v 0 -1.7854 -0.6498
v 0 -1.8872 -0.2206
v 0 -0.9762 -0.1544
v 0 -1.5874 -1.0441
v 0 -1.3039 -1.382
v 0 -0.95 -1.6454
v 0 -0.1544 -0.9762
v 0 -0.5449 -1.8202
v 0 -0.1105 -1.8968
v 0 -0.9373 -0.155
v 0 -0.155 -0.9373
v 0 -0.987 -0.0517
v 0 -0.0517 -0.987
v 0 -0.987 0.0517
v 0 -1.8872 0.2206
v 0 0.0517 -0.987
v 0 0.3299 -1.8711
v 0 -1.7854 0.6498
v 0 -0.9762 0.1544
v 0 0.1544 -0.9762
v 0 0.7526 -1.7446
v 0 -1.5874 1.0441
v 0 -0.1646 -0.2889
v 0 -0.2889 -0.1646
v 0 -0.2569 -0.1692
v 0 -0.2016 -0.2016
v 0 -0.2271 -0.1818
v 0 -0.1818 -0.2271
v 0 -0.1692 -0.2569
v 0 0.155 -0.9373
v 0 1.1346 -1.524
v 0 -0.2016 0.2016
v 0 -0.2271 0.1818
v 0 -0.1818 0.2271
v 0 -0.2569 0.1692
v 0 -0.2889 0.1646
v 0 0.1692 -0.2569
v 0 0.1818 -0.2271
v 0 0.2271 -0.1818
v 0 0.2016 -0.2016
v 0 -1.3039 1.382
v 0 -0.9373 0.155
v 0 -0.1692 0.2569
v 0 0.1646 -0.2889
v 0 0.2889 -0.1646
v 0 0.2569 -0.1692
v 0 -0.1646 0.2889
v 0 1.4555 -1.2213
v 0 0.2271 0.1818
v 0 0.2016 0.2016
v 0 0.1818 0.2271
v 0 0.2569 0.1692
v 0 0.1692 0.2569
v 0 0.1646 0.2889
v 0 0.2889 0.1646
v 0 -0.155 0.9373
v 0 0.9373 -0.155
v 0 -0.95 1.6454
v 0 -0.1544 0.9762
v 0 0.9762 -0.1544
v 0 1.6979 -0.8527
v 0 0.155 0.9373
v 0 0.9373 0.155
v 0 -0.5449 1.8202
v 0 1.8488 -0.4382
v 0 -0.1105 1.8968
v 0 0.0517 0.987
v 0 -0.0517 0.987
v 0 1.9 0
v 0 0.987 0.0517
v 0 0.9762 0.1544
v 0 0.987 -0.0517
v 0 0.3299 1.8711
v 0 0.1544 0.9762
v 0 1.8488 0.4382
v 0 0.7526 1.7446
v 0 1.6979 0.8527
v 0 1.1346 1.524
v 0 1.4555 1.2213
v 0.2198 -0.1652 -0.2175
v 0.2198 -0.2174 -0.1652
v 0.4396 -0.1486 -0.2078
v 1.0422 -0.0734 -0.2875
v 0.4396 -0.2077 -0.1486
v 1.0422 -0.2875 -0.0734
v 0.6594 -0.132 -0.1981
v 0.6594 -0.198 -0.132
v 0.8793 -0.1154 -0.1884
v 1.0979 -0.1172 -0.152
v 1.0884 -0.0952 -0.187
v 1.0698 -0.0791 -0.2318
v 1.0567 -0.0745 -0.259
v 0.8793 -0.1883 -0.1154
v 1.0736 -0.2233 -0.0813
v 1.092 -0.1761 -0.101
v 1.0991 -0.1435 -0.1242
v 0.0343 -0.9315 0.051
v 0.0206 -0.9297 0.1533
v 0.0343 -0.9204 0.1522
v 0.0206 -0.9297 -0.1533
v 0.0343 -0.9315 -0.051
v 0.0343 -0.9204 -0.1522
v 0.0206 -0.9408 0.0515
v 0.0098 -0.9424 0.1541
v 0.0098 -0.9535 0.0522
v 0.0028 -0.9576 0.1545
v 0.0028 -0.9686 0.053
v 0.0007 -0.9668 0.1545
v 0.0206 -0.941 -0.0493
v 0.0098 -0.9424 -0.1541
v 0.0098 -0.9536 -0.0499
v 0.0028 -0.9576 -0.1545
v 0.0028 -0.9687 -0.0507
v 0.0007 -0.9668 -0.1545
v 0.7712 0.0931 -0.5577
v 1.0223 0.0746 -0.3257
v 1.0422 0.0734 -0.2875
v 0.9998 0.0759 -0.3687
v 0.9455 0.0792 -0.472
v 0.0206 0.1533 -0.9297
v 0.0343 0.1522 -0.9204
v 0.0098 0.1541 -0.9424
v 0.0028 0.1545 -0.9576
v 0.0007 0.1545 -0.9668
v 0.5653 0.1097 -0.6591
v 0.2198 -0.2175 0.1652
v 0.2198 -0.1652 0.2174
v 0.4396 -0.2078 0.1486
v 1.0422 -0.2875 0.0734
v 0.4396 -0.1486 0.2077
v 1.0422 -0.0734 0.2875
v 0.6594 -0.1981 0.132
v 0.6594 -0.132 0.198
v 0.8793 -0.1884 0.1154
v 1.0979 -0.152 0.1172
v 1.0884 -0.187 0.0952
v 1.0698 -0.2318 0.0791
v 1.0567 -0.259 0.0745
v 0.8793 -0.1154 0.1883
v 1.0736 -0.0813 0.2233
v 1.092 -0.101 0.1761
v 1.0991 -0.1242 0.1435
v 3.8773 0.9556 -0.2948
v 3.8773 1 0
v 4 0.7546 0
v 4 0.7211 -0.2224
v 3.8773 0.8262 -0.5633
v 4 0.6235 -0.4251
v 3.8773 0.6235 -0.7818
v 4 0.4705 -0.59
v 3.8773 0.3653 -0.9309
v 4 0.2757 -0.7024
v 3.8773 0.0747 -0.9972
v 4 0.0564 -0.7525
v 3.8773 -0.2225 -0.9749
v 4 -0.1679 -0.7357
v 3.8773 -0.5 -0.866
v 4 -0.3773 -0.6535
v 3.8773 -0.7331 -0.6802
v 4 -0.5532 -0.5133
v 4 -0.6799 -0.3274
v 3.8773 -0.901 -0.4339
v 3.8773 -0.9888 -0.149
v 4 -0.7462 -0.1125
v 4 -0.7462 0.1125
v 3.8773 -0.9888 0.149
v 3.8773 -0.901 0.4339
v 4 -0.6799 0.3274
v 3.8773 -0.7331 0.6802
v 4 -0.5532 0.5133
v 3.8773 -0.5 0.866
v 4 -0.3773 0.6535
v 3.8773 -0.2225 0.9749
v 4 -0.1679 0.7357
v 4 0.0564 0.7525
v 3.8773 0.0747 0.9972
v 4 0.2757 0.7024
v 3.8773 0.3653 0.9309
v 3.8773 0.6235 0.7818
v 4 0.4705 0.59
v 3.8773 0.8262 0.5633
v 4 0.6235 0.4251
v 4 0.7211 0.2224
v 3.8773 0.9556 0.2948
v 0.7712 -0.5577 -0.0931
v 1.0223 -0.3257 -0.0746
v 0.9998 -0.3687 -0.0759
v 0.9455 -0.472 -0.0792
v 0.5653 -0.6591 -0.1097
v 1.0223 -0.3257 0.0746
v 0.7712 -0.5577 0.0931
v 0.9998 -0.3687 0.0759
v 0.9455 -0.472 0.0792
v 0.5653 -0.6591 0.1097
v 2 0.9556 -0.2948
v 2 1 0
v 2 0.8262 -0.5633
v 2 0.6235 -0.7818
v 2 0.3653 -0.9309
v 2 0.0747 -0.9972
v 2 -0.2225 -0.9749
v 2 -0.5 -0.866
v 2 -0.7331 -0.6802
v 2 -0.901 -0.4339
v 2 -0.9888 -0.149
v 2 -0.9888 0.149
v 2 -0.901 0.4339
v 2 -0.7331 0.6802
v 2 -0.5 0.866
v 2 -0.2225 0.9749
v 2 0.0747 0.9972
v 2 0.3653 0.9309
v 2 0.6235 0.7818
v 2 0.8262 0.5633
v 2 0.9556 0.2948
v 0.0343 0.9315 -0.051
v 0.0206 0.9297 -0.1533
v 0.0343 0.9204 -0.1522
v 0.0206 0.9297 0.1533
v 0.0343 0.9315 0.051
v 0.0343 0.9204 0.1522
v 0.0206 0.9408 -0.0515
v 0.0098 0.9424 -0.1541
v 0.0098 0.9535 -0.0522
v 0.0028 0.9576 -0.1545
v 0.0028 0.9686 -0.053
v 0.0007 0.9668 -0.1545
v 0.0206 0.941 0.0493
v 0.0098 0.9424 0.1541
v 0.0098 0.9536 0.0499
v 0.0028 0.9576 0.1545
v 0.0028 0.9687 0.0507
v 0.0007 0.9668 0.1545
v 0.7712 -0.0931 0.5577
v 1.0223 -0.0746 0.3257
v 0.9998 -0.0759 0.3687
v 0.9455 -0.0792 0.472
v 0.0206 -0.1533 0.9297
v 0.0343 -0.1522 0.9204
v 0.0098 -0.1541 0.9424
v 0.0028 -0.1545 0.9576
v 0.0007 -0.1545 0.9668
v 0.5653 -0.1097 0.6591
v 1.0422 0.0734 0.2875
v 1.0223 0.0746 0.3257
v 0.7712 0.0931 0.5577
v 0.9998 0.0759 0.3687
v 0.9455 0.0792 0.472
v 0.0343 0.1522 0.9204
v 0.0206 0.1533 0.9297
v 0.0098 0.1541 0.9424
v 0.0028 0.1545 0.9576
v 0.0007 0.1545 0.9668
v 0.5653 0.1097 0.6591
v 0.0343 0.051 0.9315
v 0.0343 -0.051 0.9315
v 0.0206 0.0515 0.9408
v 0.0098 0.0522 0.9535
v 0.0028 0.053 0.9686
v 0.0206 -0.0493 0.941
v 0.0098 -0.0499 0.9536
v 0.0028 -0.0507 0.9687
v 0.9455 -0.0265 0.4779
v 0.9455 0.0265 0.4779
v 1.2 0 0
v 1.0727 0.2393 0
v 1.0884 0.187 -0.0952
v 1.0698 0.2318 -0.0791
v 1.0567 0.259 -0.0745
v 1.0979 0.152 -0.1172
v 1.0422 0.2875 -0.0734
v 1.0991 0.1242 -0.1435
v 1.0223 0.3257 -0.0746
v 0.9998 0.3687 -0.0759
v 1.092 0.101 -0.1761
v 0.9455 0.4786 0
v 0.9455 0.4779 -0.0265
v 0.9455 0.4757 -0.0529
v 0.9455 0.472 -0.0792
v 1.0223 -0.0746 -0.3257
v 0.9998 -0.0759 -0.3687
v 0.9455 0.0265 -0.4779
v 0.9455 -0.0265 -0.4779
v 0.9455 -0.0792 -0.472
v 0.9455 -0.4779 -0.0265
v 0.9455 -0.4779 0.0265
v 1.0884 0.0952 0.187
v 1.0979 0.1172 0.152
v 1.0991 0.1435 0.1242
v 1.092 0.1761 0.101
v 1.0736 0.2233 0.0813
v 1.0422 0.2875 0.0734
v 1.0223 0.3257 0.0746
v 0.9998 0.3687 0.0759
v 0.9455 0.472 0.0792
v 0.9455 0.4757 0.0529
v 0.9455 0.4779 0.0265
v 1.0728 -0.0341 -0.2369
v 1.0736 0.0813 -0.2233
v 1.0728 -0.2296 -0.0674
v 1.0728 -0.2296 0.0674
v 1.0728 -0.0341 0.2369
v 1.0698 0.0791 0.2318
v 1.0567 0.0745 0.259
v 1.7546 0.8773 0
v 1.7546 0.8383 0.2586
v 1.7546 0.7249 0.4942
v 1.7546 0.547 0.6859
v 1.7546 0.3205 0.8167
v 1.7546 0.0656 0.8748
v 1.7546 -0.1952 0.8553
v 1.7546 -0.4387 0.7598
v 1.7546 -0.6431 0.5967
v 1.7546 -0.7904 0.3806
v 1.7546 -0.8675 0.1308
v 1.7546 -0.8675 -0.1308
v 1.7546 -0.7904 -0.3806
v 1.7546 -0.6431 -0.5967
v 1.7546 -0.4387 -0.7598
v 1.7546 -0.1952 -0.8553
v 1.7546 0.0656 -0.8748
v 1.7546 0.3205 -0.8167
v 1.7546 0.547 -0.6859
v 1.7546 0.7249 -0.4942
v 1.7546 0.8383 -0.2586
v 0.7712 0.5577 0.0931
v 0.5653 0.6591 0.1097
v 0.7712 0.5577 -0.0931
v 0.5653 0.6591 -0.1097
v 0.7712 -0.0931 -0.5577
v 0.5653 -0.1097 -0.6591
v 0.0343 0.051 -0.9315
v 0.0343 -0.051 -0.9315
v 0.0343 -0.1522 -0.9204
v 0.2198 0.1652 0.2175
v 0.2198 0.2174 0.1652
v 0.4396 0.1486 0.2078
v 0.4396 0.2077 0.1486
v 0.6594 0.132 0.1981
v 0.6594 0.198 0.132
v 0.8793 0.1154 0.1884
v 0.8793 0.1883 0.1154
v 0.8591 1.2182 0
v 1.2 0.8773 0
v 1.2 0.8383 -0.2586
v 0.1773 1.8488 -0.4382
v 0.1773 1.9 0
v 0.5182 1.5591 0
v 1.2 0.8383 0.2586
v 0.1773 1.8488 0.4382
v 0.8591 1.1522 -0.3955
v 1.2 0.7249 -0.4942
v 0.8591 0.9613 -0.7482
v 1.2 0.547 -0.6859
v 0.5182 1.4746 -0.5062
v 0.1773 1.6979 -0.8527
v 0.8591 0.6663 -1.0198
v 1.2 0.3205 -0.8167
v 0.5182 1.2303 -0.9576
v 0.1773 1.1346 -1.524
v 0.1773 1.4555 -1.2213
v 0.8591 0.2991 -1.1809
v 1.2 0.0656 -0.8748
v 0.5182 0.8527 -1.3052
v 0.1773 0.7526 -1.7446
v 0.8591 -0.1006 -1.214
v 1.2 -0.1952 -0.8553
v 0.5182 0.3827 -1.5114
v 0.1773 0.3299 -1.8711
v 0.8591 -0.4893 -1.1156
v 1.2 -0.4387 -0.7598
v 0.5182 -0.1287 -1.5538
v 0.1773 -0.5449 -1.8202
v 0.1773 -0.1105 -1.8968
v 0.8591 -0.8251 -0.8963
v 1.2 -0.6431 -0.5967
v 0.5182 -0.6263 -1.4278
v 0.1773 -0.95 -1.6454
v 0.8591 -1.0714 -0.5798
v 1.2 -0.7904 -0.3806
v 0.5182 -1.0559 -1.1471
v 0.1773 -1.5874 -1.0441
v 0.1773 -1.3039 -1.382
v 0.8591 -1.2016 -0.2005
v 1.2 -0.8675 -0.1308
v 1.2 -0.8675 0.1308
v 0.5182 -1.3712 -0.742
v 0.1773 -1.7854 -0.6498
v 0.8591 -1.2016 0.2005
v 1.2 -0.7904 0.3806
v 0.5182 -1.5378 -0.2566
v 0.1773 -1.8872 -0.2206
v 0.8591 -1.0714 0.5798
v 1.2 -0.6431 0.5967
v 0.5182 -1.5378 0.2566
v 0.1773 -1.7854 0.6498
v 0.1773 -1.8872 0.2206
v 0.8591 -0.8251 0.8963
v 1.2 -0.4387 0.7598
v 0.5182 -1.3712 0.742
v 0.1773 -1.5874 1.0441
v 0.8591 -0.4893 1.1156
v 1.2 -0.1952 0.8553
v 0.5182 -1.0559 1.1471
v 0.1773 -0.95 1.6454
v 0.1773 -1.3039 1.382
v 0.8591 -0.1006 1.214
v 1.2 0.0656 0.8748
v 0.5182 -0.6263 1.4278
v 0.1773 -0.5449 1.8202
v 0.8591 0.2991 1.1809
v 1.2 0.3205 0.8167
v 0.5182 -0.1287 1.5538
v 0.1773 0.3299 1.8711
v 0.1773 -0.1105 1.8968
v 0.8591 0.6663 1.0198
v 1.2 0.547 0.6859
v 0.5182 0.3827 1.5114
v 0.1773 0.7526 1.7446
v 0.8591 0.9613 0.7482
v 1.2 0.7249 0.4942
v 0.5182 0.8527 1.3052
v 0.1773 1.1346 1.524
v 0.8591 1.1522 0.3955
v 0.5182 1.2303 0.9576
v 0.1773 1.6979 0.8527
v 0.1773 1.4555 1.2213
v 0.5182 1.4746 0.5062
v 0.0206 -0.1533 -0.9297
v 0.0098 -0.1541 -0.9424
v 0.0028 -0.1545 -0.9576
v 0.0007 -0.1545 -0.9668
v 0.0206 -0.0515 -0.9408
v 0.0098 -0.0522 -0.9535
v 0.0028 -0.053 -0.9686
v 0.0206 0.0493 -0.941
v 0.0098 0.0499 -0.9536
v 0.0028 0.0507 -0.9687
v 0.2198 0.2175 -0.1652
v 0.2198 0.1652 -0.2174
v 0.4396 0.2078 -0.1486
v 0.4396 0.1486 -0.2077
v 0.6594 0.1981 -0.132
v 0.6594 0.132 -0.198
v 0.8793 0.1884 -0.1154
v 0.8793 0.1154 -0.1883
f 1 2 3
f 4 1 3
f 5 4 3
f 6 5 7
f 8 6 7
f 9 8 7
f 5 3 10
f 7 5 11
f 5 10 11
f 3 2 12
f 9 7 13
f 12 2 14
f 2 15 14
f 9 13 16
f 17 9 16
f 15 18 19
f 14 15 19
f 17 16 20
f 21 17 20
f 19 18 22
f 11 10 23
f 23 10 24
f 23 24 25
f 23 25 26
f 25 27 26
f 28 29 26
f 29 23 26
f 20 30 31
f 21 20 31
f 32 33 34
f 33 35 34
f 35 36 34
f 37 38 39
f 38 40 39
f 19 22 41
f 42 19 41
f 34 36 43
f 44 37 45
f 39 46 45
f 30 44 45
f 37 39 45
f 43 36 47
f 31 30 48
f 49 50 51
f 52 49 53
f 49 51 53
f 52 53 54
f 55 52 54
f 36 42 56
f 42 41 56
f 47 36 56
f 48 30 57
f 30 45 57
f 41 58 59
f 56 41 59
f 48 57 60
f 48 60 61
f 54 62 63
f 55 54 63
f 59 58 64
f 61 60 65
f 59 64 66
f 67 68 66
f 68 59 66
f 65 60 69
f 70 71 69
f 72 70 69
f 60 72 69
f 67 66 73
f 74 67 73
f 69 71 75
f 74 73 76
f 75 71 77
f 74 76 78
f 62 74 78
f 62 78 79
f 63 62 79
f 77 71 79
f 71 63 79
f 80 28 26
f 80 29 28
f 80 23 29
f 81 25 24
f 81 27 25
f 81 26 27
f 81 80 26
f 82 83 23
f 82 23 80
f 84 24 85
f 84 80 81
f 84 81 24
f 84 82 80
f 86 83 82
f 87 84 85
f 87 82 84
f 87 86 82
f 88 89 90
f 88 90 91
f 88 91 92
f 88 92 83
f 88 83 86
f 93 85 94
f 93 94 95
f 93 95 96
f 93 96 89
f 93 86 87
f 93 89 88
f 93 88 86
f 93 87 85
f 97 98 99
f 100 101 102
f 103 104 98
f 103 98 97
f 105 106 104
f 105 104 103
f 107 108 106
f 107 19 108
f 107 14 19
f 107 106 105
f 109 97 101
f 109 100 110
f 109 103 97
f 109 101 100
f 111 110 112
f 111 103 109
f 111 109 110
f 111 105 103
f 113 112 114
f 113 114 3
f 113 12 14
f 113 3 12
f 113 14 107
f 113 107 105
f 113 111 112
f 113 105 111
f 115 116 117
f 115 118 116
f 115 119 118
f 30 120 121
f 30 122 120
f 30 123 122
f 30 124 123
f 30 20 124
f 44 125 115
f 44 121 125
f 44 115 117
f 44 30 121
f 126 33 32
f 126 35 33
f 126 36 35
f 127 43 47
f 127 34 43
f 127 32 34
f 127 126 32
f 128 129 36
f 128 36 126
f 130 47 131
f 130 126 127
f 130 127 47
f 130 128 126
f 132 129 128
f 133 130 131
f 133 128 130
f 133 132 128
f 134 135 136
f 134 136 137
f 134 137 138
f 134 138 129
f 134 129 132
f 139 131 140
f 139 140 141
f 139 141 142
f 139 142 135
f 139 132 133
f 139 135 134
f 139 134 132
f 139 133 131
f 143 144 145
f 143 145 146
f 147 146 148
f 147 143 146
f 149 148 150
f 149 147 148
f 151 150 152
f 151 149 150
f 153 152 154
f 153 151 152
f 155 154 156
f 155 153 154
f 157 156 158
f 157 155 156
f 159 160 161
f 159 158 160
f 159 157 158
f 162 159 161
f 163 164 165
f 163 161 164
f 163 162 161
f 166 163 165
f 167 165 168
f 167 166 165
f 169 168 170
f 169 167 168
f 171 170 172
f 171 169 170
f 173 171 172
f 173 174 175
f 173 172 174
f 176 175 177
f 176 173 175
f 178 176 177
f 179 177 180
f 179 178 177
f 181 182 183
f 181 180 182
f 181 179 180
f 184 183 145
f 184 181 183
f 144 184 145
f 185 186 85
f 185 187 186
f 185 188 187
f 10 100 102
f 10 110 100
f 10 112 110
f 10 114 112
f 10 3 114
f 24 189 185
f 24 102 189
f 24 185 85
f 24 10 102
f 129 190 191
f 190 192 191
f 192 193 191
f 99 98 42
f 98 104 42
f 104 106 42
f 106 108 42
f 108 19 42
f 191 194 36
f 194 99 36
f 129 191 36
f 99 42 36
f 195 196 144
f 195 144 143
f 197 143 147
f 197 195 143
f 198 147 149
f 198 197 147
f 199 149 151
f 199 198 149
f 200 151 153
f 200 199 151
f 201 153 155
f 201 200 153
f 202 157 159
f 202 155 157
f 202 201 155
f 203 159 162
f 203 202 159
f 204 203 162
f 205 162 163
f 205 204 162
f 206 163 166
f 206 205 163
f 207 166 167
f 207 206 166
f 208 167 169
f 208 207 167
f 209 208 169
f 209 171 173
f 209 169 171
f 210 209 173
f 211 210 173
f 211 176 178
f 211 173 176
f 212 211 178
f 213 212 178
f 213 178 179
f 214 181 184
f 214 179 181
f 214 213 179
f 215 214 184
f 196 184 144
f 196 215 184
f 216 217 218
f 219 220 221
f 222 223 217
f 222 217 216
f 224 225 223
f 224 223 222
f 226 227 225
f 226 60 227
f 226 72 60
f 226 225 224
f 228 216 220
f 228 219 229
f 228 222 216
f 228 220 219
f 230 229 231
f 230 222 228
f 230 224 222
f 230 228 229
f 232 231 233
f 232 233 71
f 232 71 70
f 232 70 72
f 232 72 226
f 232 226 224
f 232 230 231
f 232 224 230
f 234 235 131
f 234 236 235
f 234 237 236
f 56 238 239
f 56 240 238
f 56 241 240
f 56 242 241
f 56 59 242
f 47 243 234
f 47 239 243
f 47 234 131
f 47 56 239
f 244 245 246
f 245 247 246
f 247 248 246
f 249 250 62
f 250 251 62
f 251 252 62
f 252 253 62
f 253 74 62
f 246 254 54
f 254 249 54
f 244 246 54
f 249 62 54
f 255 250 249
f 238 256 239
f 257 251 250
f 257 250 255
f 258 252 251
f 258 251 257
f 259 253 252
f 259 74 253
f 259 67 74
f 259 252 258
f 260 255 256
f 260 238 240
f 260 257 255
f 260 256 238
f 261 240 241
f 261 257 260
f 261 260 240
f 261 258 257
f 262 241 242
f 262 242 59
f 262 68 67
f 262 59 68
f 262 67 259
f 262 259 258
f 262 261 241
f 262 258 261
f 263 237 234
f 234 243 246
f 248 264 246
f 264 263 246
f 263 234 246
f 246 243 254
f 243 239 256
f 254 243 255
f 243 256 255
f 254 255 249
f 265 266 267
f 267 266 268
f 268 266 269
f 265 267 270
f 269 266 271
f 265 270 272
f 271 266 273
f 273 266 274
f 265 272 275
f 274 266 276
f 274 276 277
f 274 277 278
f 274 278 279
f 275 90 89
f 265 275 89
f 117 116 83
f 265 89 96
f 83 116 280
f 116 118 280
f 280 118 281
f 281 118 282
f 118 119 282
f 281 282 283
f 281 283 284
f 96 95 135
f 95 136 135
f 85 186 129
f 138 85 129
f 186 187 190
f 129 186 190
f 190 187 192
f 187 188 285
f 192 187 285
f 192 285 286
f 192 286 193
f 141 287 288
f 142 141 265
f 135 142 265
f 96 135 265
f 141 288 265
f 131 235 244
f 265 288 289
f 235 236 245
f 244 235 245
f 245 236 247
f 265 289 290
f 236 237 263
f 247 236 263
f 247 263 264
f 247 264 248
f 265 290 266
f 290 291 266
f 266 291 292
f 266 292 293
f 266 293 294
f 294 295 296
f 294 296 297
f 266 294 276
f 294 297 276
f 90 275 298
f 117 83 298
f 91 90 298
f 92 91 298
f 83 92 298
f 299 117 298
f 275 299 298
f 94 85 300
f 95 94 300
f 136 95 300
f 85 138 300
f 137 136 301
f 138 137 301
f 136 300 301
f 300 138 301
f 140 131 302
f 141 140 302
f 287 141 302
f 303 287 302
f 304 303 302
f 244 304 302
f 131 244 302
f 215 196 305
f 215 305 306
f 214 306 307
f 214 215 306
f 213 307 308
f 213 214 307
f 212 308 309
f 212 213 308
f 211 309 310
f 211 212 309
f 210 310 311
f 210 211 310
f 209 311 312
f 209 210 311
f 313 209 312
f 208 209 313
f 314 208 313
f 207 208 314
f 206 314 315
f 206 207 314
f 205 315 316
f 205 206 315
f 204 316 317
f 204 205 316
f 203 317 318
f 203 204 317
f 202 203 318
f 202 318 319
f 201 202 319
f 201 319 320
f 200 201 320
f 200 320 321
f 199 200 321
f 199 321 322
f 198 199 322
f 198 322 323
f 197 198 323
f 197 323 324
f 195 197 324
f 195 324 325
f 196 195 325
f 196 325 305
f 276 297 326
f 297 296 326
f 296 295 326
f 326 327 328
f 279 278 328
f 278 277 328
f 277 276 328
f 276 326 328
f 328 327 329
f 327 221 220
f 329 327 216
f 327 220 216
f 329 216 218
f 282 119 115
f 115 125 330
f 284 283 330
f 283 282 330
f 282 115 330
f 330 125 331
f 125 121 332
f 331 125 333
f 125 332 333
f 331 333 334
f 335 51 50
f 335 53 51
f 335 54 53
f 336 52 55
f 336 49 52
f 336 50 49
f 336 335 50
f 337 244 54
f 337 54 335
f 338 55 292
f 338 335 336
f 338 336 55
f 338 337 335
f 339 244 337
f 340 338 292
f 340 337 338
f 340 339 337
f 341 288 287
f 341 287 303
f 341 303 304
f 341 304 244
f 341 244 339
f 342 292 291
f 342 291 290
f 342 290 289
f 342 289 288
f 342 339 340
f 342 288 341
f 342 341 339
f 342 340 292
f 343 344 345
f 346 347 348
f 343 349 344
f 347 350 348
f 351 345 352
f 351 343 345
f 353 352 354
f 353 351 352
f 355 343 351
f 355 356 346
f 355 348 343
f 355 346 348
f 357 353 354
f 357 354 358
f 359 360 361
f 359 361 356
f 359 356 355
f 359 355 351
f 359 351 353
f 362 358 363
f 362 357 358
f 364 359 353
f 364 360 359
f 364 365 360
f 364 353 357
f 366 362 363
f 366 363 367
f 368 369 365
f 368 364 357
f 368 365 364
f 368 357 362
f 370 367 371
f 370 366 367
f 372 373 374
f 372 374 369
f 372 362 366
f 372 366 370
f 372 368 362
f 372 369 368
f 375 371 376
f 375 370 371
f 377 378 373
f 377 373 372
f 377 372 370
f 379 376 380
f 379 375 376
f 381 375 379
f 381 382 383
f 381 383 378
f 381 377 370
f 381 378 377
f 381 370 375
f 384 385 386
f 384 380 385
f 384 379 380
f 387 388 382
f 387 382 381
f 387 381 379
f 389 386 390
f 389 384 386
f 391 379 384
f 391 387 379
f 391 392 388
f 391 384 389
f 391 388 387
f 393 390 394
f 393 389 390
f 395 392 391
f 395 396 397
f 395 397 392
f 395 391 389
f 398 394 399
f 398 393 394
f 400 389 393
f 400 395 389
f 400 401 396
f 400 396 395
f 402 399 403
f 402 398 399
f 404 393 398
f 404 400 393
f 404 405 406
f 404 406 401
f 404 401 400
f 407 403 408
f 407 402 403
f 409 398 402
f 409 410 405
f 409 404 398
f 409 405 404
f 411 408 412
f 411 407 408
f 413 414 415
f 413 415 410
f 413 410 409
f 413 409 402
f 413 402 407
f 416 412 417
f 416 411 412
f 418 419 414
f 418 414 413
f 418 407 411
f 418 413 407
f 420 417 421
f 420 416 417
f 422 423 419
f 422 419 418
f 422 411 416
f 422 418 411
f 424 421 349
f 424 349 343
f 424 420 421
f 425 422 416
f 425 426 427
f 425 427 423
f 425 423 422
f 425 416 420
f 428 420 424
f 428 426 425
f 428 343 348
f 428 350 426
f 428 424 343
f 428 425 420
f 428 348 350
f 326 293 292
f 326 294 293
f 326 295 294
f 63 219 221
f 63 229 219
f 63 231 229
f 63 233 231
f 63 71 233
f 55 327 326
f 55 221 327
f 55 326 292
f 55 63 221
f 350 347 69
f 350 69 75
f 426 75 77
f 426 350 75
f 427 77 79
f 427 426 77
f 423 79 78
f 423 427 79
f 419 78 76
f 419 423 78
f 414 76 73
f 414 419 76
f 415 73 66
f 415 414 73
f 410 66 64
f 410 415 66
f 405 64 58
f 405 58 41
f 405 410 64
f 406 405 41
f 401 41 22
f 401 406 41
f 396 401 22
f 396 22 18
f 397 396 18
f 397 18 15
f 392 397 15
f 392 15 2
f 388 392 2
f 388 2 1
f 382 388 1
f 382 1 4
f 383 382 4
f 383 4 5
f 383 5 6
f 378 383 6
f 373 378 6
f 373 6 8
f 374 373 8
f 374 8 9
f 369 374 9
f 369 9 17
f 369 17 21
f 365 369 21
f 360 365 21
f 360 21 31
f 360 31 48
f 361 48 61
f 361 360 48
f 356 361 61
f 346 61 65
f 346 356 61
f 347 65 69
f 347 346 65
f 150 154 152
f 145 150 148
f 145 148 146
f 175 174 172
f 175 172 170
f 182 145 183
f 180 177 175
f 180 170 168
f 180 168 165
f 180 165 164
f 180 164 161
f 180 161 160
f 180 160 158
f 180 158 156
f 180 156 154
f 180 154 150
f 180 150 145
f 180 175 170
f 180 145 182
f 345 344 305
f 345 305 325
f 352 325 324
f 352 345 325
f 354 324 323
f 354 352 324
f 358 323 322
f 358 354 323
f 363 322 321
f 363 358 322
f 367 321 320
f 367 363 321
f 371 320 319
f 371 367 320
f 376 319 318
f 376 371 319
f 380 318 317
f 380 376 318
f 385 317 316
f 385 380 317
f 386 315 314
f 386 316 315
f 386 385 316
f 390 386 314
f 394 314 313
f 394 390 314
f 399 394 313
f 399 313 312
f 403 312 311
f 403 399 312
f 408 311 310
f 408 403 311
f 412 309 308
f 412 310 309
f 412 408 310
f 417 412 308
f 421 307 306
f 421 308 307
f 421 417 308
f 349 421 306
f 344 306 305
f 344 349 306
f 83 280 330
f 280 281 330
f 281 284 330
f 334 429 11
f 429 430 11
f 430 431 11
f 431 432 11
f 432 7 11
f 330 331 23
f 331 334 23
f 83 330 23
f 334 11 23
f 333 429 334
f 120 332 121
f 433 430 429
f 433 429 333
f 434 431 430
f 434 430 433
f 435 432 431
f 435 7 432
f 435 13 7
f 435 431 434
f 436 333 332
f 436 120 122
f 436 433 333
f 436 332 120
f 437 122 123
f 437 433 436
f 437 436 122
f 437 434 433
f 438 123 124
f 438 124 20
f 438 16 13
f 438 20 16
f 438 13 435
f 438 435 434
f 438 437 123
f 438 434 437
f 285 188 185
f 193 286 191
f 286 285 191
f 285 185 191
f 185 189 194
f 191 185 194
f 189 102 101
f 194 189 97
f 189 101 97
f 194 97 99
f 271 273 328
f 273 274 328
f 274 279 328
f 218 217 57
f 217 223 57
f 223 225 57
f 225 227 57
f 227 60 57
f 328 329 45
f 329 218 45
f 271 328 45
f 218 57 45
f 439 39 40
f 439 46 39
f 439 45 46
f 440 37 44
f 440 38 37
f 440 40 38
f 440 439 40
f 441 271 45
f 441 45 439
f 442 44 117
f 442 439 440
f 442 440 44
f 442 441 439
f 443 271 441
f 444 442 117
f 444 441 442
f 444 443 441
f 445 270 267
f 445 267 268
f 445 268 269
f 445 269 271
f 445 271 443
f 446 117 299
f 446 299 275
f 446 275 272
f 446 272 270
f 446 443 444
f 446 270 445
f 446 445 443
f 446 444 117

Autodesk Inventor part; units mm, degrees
ref_plane "YZ Plane" through (0, 0, 0) normal (1, 0, 0) x (0, 1, 0)
ref_plane "XZ Plane" through (0, 0, 0) normal (0, 1, 0) x (-1, 0, 0)
sketch "Skizze1" plane through (0, 0, 0) normal (0, 0, 1) x (1, 0, 0)
  line L0 (1.2, 0) -> (4, 0)
  line L1 (4, 0) -> (4, 1)
  line L2 (4, 1) -> (2, 1)
  line L3 (2, 1) -> (1.7546, 0.8773)
  line L4 (1.7546, 0.8773) -> (1.2, 0.8773)
  line L5 (0, 1.9) -> (0, 0.95)
  line L6 (0, 0.95) -> (0.9455, 0.4786)
  line L7 (0.9455, 0.4786) -> (1.2, 0)
  line L8 (-0.8, 0) -> (4.8, 0) projected
  line L9 (0, -0.38) -> (0, 2.28) projected
  line L10 (0, 1.9) -> (0.1773, 1.9)
  line L11 (0.1773, 1.9) -> (1.2, 0.8773)
  line L12 (2, 1) -> (1.0773, 1) construction
  dimension "d1" = 2
  dimension "d2" = 2
  dimension "d3" = 1.7546
  dimension "d4" = 1.9
  dimension "d5" = 26.5
  dimension "d6" = 62
  dimension "d7" = 1.2
  dimension "d8" = 0.2454
  dimension "d12" = 3.8
  dimension "d13" = 45
  dimension "d15" = 4
  dimension "d24" = 1.2
revolve "Körper" add sketch "Skizze1" angle 360 about axis through (1.2, 0, 0) along (1, 0, 0) contours L7 L6 L5 L10 L11 L4 L3 L2 L1 L0
sketch "Skizze2" plane through (0, 0, 0) normal (-1, 0, 0) x (0, 0, 1)
  line L0 (0, 0.95) -> (0, 0) construction
  line L1 (0, 0) -> (0.95, 0) construction
  arc A0 (0.285, 0) -> (0, 0.285) centre (0, 0) ccw construction
  arc A1 (0.3325, 0) -> (0, 0.3325) centre (0, 0) ccw construction
  arc A2 (0.9373, 0.155) -> (0.155, 0.9373) centre (0, 0) ccw
  line L2 (0, 0) -> (0.6718, 0.6718) construction
  line L3 (0.155, 0.9373) -> (0.1646, 0.2889)
  line L4 (0.9373, 0.155) -> (0.2889, 0.1646)
  arc A3 (0.155, 0.9373) -> (0, 0.95) centre (0, 0) ccw
  arc A4 (0.95, 0) -> (0.9373, 0.155) centre (0, 0) ccw
  line L5 (0, -2.66) -> (0, 2.66) projected
  line L6 (-2.66, 0) -> (2.66, 0) projected
  arc A5 (0.155, -0.9373) -> (0.9373, -0.155) centre (0, 0) ccw
  line L7 (0.155, -0.9373) -> (0.1646, -0.2889)
  line L8 (0.9373, -0.155) -> (0.2889, -0.1646)
  arc A6 (0, -0.95) -> (0.155, -0.9373) centre (0, 0) ccw
  arc A7 (0.9373, -0.155) -> (0.95, 0) centre (0, 0) ccw
  arc A8 (-0.155, 0.9373) -> (-0.9373, 0.155) centre (0, 0) ccw
  line L9 (-0.155, 0.9373) -> (-0.1646, 0.2889)
  line L10 (-0.9373, 0.155) -> (-0.2889, 0.1646)
  arc A9 (0, 0.95) -> (-0.155, 0.9373) centre (0, 0) ccw
  arc A10 (-0.9373, 0.155) -> (-0.95, 0) centre (0, 0) ccw
  arc A11 (-0.155, -0.9373) -> (0, -0.95) centre (0, 0) ccw
  arc A12 (-0.9373, -0.155) -> (-0.155, -0.9373) centre (0, 0) ccw
  arc A13 (-0.95, 0) -> (-0.9373, -0.155) centre (0, 0) ccw
  line L11 (-0.9373, -0.155) -> (-0.2889, -0.1646)
  line L12 (-0.155, -0.9373) -> (-0.1646, -0.2889)
  arc A14 (0.1646, 0.2889) -> (0.2889, 0.1646) centre (0.2908, 0.2908) ccw
  arc A15 (0.2889, -0.1646) -> (0.1646, -0.2889) centre (0.2908, -0.2908) ccw
  arc A16 (-0.2889, 0.1646) -> (-0.1646, 0.2889) centre (-0.2908, 0.2908) ccw
  arc A17 (-0.1646, -0.2889) -> (-0.2889, -0.1646) centre (-0.2908, -0.2908) ccw
  point P0 (0.6718, -0.6718)
  point P1 (-0.6718, 0.6718)
  point P2 (-0.6718, -0.6718)
  dimension "d17" = 0.57
  dimension "d18" = 0.665
  dimension "d19" = 1.9
  dimension "d20" = 45
  dimension "d21" = 0.155
extrude "Loch" add sketch "Skizze2" against normal up to next draft 5 contours L4 A14 L3 A2 | A5 L7 A15 L8 | L9 A16 L10 A8 | A12 L11 A17 L12
fillet "Rundung1" radius 0.062 4 edges at (0, 0.95, 0) (0, 0, -0.95) (0, -0.95, 0) (0, 0, 0.95)
thread "Gewinde" size "M2x0.4" class "6g" standard "ISO Metric profile" length 2
chamfer "Fase1" distance 0.2454 distance2 0.1227 1 edges at (4, -1, 0) measured on face at (4, 0.479, -0.3842)
ref_plane "Work Plane2" through (3.35, 0, 0) normal (0, 0, -1) x (1, 0, 0)
equation "\"d1\" = GEL"
equation "\"d2\" = GD"
equation "\"d3\" = BDM"
equation "\"d4\" = SDM"
equation "\"d7\" = INTI"
equation "\"d8\" = GAL"
equation "\"d12\" = KOD"
equation "\"d13\" = 0.5 * SEWI"
equation "\"d15\" = NLG"
equation "\"d24\" = KOH"
equation "\"d17\" = 0.3 * SDM"
equation "\"d18\" = 0.35 * SDM"
equation "\"d19\" = SDM"
equation "\"d21\" = 0.5 * SBR"
equation "\"d23\" = 0.2 * SBR"
equation "\"d10\" = GEL"
equation "\"d25\" = -0.5 * SPD + 0.5 * GD"
equation "\"d26\" = 0.5 * GAL"
equation "\"NLG\" = 4"
equation "\"GEL\" = 2"
equation "\"GAL\" = 0.61345 * PTC"
equation "\"SPD\" = NND - 1.2269 * PTC"
equation "\"KOD\" = 3.8"
equation "\"KOH\" = 1.2"
equation "\"SBR\" = 0.31"
equation "\"INTI\" = 1.2"
equation "\"SDM\" = 1.9"
equation "\"GD\" = NND"
equation "\"BDM\" = NND - GAL"
equation "\"SEWI\" = 90deg"
equation "\"d9\" = SDM"
equation "\"GUL\" = 0.61345 * PTC"
equation "\"TOA\" = 30deg"
equation "\"EPV\" = 2.2"
equation "\"THREADDIA\" = 2"
equation "\"PTC\" = 0.4"
equation "\"NND\" = 2"
equation "\"GD1\" = THREADDIA - 1.2269 * PTC"
properties part number "ISO 7046-1 - M2 x 4 - 4.8 - H" material "Stahl"
